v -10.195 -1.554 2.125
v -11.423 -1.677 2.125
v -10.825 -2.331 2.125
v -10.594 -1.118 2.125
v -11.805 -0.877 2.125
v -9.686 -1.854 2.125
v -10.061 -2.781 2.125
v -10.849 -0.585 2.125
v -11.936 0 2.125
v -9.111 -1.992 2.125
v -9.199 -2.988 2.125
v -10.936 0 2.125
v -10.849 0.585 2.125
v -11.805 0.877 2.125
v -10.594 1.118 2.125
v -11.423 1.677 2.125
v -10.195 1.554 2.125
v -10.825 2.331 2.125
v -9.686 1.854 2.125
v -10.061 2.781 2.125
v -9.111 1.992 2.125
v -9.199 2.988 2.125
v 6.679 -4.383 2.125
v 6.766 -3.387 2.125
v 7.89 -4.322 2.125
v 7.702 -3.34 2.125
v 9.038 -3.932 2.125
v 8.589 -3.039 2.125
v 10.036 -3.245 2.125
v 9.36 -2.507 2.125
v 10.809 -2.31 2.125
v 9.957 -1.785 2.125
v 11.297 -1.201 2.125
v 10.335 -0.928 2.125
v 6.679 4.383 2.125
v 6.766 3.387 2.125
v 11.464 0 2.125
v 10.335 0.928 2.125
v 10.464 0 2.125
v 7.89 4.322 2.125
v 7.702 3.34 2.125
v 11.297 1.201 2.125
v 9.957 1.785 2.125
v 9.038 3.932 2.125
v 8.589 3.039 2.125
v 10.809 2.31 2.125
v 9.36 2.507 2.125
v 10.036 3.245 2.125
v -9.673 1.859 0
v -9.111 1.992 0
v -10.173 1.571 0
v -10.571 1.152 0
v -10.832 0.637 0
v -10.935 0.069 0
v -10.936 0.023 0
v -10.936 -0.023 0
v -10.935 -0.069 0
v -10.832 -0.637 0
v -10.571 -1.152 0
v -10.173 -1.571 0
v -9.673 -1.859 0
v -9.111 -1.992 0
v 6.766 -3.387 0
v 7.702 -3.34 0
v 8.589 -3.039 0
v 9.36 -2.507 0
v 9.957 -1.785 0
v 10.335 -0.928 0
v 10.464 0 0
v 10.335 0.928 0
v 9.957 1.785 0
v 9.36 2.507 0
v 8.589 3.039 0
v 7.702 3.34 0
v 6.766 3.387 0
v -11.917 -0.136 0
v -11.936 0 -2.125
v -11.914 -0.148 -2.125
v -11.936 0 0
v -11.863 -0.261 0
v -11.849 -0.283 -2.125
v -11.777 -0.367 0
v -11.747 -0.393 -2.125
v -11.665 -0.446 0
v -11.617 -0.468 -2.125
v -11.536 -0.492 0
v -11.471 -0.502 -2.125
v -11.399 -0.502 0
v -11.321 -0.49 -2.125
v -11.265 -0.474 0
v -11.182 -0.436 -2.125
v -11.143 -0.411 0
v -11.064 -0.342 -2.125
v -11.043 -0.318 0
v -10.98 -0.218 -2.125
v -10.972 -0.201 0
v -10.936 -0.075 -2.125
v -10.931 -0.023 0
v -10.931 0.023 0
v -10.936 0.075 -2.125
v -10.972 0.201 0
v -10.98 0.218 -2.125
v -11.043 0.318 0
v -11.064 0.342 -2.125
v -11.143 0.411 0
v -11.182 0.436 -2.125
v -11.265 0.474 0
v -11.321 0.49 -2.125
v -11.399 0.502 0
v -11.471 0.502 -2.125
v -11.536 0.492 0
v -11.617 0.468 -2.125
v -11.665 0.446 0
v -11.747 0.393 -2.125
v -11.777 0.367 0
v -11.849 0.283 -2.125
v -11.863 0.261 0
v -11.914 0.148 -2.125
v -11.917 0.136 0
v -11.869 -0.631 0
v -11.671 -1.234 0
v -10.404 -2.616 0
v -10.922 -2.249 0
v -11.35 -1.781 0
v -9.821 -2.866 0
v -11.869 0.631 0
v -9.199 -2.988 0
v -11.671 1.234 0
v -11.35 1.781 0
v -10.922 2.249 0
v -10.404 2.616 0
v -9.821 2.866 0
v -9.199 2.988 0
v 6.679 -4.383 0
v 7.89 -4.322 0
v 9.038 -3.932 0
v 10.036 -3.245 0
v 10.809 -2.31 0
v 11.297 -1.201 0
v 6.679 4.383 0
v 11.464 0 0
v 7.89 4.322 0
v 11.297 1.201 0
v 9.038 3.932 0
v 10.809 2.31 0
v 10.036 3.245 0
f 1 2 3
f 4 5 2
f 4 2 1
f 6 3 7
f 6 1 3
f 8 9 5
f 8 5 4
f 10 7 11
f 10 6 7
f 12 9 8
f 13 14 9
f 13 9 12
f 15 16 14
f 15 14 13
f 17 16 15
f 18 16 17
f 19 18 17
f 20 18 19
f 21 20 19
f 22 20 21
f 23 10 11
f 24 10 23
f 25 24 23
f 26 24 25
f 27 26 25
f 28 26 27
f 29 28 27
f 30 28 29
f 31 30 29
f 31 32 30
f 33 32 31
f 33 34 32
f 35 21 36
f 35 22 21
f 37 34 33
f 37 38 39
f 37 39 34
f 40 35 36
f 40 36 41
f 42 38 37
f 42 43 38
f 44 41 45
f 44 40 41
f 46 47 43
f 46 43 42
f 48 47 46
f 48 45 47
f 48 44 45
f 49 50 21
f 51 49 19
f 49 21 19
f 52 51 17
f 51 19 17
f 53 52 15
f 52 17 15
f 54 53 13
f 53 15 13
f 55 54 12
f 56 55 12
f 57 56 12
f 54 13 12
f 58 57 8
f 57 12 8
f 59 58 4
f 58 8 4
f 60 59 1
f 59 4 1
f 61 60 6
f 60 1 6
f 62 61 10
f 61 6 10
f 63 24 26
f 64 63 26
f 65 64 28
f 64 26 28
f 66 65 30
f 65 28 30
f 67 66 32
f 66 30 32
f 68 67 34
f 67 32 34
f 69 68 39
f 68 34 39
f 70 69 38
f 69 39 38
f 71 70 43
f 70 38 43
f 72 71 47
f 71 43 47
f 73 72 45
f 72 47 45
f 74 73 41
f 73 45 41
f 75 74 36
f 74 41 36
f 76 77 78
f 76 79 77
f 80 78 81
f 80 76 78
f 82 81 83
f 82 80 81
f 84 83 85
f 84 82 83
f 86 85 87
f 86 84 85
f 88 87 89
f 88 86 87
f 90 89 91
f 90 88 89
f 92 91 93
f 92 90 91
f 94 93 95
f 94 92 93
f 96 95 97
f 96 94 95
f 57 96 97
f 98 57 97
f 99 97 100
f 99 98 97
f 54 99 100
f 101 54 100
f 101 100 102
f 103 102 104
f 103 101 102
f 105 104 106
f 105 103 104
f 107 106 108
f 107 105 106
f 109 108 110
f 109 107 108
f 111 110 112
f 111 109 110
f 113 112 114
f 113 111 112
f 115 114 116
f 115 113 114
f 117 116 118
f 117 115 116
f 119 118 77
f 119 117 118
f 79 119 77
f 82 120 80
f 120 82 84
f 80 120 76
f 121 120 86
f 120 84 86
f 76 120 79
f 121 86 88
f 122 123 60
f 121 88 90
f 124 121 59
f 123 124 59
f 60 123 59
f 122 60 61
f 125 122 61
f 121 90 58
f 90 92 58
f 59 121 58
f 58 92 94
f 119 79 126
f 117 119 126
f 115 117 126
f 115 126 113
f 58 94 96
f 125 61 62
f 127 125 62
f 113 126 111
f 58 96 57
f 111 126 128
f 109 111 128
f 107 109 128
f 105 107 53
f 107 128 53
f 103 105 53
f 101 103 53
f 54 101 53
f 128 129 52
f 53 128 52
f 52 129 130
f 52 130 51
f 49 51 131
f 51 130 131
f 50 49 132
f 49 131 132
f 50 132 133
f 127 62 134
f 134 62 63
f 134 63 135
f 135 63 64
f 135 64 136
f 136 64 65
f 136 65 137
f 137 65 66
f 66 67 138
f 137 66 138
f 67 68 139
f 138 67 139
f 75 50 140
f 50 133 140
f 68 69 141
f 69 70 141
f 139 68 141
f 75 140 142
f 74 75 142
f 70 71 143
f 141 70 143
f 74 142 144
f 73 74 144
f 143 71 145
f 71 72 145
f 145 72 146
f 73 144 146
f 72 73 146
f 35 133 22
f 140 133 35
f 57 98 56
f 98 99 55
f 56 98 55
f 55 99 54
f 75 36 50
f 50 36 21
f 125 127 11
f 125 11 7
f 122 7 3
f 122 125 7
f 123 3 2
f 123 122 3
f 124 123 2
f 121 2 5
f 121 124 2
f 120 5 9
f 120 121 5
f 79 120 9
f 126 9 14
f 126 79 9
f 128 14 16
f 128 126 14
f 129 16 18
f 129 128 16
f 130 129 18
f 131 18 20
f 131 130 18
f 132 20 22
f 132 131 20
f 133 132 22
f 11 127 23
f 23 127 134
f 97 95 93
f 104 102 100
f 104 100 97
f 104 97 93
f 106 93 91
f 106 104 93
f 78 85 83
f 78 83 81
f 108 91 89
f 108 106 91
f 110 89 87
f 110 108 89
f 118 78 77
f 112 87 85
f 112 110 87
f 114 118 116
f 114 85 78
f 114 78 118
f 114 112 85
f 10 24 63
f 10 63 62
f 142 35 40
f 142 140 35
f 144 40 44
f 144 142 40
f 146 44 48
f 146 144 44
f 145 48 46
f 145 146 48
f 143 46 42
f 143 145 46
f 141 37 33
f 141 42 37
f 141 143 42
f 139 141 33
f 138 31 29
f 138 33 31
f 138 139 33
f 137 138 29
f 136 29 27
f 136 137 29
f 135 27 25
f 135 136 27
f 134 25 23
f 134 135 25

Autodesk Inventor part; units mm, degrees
ref_plane "YZ Plane" through (0, 0, 0) normal (1, 0, 0) x (0, 1, 0)
ref_plane "XZ Plane" through (0, 0, 0) normal (0, 1, 0) x (-1, 0, 0)
ref_plane "XY Plane" through (0, 0, 0) normal (0, 0, 1) x (1, 0, 0)
sketch "Szkic1" plane through (0, 0, 0) normal (0, 0, 1) x (1, 0, 0)
  line L0 (6.7664, -3.387) -> (-9.1111, -1.9923) projected
  arc A0 (6.7664, 3.387) -> (6.7664, -3.387) centre (7.0639, 0) ccw construction
  line L1 (6.7664, 3.387) -> (-9.1111, 1.9923) projected
  arc A1 (-9.1111, 1.9923) -> (-9.1111, -1.9923) centre (-8.9361, 0) ccw projected
  circle A2 centre (-5.2361, 0) radius 0.5 projected
  circle A3 centre (-7.1361, 0) radius 0.5 projected
  circle A4 centre (-9.0361, 0) radius 0.5 projected
  circle A5 centre (2.3639, 0) radius 0.5 projected
  circle A6 centre (0.4639, 0) radius 0.5 projected
  circle A7 centre (-1.4361, 0) radius 0.5 projected
  circle A8 centre (-3.3361, 0) radius 0.5 projected
  circle A9 centre (7.0639, 0) radius 3.4 construction
  arc A10 (6.6789, -4.3831) -> (6.6789, 4.3831) centre (7.0639, 0) ccw
  line L2 (6.7664, 3.387) -> (-9.1111, 1.9923) projected
  line L3 (6.7664, -3.387) -> (-9.1111, -1.9923) projected
  arc A11 (-9.1111, 1.9923) -> (-9.1111, -1.9923) centre (-8.9361, 0) ccw projected
  arc A12 (-9.1986, 2.9885) -> (-9.1986, -2.9885) centre (-8.9361, 0) ccw
  line L4 (-9.1986, -2.9885) -> (6.6789, -4.3831)
  line L5 (-9.1986, 2.9885) -> (6.6789, 4.3831)
  circle A13 centre (7.0639, 0) radius 3.4 projected
  line L6 (6.7664, 3.387) -> (-9.1111, 1.9923) projected
  line L7 (6.7664, -3.387) -> (-9.1111, -1.9923) projected
  arc A14 (-9.1111, 1.9923) -> (-9.1111, -1.9923) centre (-8.9361, 0) ccw projected
  dimension "d1" = 1
extrude "Wyciągnięcie proste1" add sketch "Szkic1" along normal blind 2.125 contours L0 A1 L1 A13 | A13 | A2 | A3 | A4 | A5 | A6 | A7 | A8 | L4 A12 L5 A10
sketch "Szkic2" plane through (0, 0, 2.125) normal (0, 0, 1) x (1, 0, 0)
  circle A0 centre (7.0639, 0) radius 3.4 projected
  arc A1 (-9.1111, 1.9923) -> (-9.1111, -1.9923) centre (-8.9361, 0) ccw projected
  line L0 (6.7664, -3.387) -> (-9.1111, -1.9923) projected
  line L1 (6.7664, 3.387) -> (-9.1111, 1.9923) projected
  point P0 (0, 0)
extrude "Wyciągnięcie proste2" cut sketch "Szkic2" against normal blind 2.125
sketch "Szkic3" plane through (0, 0, 0) normal (0, 0, -1) x (-1, 0, 0)
  circle A0 centre (11.4331, 0) radius 0.503
  point P0 (0, 0)
extrude "Wyciągnięcie proste3" add sketch "Szkic3" along normal blind 2.125
properties part number "adapter"
